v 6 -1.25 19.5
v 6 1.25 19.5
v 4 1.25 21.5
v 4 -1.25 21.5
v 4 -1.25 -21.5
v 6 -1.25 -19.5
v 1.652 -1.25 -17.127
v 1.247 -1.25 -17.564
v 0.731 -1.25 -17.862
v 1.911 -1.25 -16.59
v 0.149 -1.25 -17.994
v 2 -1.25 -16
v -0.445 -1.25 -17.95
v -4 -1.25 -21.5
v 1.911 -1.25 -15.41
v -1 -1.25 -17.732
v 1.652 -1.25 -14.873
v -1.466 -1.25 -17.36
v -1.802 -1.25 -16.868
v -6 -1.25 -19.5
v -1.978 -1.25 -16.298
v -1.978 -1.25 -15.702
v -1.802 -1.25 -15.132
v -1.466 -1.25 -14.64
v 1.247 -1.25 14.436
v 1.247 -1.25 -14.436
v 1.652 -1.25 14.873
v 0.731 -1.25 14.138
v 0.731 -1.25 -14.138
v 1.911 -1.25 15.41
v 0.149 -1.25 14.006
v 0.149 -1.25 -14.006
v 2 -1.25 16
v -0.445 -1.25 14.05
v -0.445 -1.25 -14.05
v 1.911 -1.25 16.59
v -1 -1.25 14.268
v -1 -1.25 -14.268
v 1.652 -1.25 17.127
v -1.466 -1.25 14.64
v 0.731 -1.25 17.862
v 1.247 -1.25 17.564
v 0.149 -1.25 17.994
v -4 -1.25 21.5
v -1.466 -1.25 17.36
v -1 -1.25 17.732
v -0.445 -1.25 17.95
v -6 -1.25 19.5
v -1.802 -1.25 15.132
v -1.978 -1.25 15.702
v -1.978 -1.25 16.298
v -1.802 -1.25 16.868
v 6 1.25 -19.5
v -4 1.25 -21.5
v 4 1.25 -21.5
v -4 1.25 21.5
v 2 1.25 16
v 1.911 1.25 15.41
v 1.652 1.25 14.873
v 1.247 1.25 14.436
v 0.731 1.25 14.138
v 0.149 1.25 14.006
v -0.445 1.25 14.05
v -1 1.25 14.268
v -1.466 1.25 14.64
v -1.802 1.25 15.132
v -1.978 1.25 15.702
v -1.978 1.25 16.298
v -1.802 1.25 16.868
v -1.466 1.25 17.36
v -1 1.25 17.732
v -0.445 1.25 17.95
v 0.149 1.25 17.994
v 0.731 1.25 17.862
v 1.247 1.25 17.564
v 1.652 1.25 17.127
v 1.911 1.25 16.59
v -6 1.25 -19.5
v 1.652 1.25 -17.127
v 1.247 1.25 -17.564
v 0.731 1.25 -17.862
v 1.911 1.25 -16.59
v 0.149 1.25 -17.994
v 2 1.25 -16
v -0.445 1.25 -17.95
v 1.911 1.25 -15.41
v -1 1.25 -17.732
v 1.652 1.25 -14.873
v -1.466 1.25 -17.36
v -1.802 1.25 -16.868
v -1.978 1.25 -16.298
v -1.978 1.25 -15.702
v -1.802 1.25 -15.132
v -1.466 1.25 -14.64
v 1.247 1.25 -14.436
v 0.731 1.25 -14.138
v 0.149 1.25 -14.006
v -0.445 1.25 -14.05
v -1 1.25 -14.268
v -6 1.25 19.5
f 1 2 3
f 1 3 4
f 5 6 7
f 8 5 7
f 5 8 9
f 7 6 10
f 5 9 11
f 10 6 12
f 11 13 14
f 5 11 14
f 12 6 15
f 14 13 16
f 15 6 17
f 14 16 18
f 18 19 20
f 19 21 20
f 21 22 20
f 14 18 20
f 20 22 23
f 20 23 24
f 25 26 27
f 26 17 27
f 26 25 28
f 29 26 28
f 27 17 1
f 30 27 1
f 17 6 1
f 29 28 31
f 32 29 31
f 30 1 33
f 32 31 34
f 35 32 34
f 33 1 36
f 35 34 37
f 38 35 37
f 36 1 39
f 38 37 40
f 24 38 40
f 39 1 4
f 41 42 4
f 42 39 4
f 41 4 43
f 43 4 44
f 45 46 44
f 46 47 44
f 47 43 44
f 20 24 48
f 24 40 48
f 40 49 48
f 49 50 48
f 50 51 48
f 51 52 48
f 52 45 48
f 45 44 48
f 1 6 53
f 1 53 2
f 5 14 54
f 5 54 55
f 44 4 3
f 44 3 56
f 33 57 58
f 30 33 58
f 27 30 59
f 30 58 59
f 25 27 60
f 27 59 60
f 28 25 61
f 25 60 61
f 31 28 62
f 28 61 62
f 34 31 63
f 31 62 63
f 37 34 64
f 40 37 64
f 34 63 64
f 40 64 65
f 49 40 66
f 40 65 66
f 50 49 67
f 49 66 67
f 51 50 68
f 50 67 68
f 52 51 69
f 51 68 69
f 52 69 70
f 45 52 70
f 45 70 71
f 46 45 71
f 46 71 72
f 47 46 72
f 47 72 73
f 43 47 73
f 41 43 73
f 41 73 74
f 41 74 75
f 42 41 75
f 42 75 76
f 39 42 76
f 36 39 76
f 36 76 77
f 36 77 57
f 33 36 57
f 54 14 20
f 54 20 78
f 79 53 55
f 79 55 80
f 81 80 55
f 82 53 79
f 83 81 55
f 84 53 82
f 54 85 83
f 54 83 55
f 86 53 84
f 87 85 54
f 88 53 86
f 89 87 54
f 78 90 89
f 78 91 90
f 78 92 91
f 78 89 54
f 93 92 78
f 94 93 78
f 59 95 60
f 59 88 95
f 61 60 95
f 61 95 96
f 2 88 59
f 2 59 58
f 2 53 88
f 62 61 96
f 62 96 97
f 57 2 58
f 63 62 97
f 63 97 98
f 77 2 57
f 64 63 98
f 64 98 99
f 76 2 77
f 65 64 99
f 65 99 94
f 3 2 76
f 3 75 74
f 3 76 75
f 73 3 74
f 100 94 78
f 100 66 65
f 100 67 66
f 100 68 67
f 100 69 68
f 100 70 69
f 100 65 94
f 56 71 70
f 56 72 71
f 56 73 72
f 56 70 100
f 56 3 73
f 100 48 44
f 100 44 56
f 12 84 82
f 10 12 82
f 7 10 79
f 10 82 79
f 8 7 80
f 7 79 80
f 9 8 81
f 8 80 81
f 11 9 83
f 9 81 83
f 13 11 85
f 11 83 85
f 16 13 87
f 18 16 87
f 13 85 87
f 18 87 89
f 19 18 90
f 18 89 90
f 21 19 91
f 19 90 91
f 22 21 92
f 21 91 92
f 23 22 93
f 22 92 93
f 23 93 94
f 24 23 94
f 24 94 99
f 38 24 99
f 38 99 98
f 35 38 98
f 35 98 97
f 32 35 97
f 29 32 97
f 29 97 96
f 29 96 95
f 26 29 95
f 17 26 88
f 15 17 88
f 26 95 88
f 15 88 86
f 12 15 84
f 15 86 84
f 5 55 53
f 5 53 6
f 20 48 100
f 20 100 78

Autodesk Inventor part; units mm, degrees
ref_plane "YZ Plane" through (0, 0, 0) normal (1, 0, 0) x (0, 1, 0)
ref_plane "XZ Plane" through (0, 0, 0) normal (0, 1, 0) x (-1, 0, 0)
ref_plane "XY Plane" through (0, 0, 0) normal (0, 0, 1) x (1, 0, 0)
sketch "Sketch1" plane through (0, 0, 0) normal (0, 1, 0) x (-1, 0, 0)
  line L0 (-6, 21.5) -> (6, 21.5)
  line L1 (6, 21.5) -> (6, -21.5)
  line L2 (6, -21.5) -> (-6, -21.5)
  line L3 (-6, -21.5) -> (-6, 21.5)
  line L4 (-6, 21.5) -> (6, -21.5) construction
  line L5 (6, 21.5) -> (-6, -21.5) construction
  point P0 (0, 0)
  dimension "d0" = 12
  dimension "d1" = 43
extrude "Extrusion1" add sketch "Sketch1" along normal mid plane 2.5
sketch "Sketch2" plane through (0, 1.25, 0) normal (0, 1, 0) x (1, 0, 0)
  circle A0 centre (0, -16) radius 2
  line L0 (6, 21.5) -> (-6, 21.5) construction
  line L1 (-6, 21.5) -> (-6, -21.5) construction
  line L2 (-6, -21.5) -> (6, -21.5) construction
  line L3 (6, -21.5) -> (6, 21.5) construction
  line L4 (-6, 21.5) -> (-6, -21.5) construction
  line L5 (-6, 0) -> (6, 0) construction
  circle A1 centre (0, 16) radius 2
  point P0 (0, 0)
  dimension "d4" = 4
  dimension "d5" = 16
extrude "Extrusion2" cut sketch "Sketch2" against normal through all
chamfer "Chamfer1" distance 2 angle 45 4 edges at (-6, 0, 21.5) (6, 0, 21.5) (6, 0, -21.5) (-6, 0, -21.5)
properties part number "ArmMotorSpacer"
